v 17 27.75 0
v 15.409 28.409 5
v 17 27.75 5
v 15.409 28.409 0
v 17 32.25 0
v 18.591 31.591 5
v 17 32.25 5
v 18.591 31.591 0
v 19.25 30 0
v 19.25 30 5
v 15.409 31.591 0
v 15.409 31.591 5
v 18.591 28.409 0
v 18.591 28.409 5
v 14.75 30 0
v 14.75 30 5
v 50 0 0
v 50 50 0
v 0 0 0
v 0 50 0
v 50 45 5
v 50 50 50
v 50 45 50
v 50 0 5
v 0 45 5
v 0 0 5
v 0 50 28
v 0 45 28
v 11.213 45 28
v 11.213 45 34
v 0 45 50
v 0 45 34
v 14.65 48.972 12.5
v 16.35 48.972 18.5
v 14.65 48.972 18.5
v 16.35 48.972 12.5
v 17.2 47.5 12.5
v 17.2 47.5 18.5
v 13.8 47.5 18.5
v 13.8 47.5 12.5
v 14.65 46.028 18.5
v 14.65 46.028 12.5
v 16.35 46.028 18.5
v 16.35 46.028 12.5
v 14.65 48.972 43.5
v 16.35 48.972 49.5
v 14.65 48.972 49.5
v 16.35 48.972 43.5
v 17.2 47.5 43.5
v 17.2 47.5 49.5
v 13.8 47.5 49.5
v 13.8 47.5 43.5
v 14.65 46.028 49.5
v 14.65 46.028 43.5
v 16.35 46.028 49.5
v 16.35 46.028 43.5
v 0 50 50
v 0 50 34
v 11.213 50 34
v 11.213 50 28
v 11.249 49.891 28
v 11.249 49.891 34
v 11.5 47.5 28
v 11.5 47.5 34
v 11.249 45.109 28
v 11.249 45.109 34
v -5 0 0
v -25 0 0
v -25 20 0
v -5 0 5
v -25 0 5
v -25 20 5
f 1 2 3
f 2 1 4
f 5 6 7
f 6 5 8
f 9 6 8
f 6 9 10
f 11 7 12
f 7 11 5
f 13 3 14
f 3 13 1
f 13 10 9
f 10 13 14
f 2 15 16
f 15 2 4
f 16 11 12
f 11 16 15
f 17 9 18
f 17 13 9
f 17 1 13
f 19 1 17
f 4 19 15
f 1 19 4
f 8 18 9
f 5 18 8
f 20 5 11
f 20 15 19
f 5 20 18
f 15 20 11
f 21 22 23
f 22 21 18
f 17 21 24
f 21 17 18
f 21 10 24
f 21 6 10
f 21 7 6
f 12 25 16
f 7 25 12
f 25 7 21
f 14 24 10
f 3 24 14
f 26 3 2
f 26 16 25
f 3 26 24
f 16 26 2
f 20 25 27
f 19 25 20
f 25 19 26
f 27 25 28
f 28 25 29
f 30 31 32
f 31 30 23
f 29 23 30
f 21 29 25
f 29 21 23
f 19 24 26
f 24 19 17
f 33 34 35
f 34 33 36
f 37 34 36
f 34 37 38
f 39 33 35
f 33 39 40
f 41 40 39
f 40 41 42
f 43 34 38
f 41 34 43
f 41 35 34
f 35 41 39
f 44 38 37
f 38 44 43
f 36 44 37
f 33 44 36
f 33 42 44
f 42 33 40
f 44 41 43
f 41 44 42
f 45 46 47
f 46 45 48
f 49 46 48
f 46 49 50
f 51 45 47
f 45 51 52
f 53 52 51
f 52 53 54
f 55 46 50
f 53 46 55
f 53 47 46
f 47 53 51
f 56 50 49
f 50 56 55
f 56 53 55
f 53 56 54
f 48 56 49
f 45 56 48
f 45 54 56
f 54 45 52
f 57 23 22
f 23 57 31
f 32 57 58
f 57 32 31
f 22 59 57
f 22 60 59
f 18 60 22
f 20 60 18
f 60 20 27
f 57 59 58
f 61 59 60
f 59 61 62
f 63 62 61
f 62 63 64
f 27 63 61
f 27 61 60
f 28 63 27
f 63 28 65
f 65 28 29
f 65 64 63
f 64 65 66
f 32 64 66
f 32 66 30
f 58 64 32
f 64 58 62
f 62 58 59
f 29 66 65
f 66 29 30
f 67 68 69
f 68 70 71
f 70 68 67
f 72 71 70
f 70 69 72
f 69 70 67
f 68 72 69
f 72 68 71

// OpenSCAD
// NEMA 17 Stepper Motor Mounting Bracket for Syringe Pump
// Units: millimetres

// --- Base Plate Dimensions ---
base_width = 50;       // X extent: -25 to 25
base_depth = 45;      // Y extent: 0 to 45
base_thickness = 5;    // Z extent: 0 to 5

// --- Base Plate Hole Locations ---
hole_m4_x = 17;        // X position of M4 holes (symmetric)
hole_m4_y = 30;        // Y position of M4 holes
hole_m4_dia = 4.5;     // Diameter for M4 threaded holes

// --- Vertical Motor Plate Dimensions ---
motor_plate_width = 50; // X extent: -25 to 25
motor_plate_height = 50; // Z extent: 0 to 50
motor_plate_thickness = 5; // Y extent: 0 to 5 (standing on base)

// --- Motor Plate Features ---
motor_boss_dia = 23;    // Diameter of centring boss hole
motor_boss_x = 0;       // X center of boss hole
motor_boss_z = 28;      // Z center of boss hole

// M3 Screw Pattern
screw_pattern_size = 31; // Square pattern size for M3 holes
screw_dia = 3.4;       // Diameter for M3 holes
screw_offset = screw_pattern_size / 2; // Distance from center to hole

// --- Gusset Dimensions ---
gusset_thickness = 5;   // Thickness of gussets
gusset_leg_y = 20;      // Length of leg along Y
gusset_leg_z = 20;      // Length of leg along Z
gusset_corner_y = 5;    // Y position of right-angle corner
gusset_corner_z = 5;    // Z position of right-angle corner

// --- Helper Variables ---
// Ensure holes extend past faces for clean cuts
hole_extend = 1;        // Extra length for through-holes

// --- Main Assembly ---

module base_plate() {
    // Main base block
    difference() {
        cube([base_width, base_depth, base_thickness], center = false);
        
        // Two M4 holes
        for (i = [-1, 1]) {
            translate([i * hole_m4_x, hole_m4_y, 0])
                cylinder(d = hole_m4_dia, h = base_thickness + hole_extend, center = false);
        }
    }
}

module motor_plate() {
    // Main vertical block
    difference() {
        cube([motor_plate_width, motor_plate_thickness, motor_plate_height], center = false);
        
        // Centering boss hole (23mm)
        translate([motor_boss_x, motor_plate_thickness/2, motor_boss_z])
            cylinder(d = motor_boss_dia, h = motor_plate_thickness + hole_extend, center = false);
        
        // Four M3 screw holes on 31mm square pattern
        for (i = [-1, 1]) {
            for (j = [-1, 1]) {
                translate([i * screw_offset, motor_plate_thickness/2, motor_boss_z + j * screw_offset])
                    cylinder(d = screw_dia, h = motor_plate_thickness + hole_extend, center = false);
            }
        }
    }
}

module gusset(side) {
    // side = -1 for left, 1 for right
    // Right triangle in YZ plane
    // Legs: 20mm along Y, 20mm along Z
    // Right angle at (y=5, z=5)
    // Hypotenuse connects (y=25, z=5) to (y=5, z=25)
    
    translate([side * 25, 0, 0]) // Position at edge of base (x = -25 or 25)
        linear_extrude(height = gusset_thickness)
            polygon([
                [0, 0],
                [0, gusset_leg_y],
                [gusset_leg_z, gusset_leg_y], // Wait, let's re-verify geometry
                // Right angle at y=5, z=5.
                // Leg 1: y from 5 to 25 (length 20).
                // Leg 2: z from 5 to 25 (length 20).
                // Triangle vertices: (5,5), (25,5), (5,25).
                // In 2D polygon (y, z):
                [5, 5],
                [25, 5],
                [5, 25]
            ]);
}

// --- Construction ---

union() {
    // Base plate
    base_plate();
    
    // Vertical motor plate (placed on back edge of base)
    // Base is at z=0, motor plate stands on it.
    // Motor plate Y range: 0 to 5. Base Y range: 0 to 45.
    // "Standing on the back edge of the base" implies Y=0 of motor plate aligns with Y=0 of base?
    // Or does it mean the back edge of the base (Y=45)?
    // Re-reading: "standing on the back edge of the base".
    // Usually, an L-bracket has the vertical part at the back.
    // If base is Y 0..45, back edge is Y=45.
    // If motor plate is Y 0..5, and stands on back edge, its Y=0 should be at base Y=45.
    // Let's align motor plate Y=0 with base Y=45.
    translate([0, 45, 0])
        motor_plate();
    
    // Gussets
    // Left gusset: x from -25 to -20.
    // Right gusset: x from 20 to 25.
    // "flush with the left and right edges (x = -25 to -20 and x = 20 to 25)"
    // This implies the gusset is a triangular prism.
    // The previous module `gusset` used a polygon in YZ plane extruded in X.
    // Let's adjust the gusset module to be a solid block with triangular cross-section.
    
    // Left Gusset
    translate([-25, 0, 0])
        linear_extrude(height = 5) // Thickness in X? No, thickness is 5mm.
            // Wait, "5 mm thick, flush with left and right edges".
            // If it's flush with x=-25 to -20, the thickness is 5mm in X.
            // The triangle is in YZ plane.
            // So we extrude the triangle along X from -25 to -20.
            polygon([
                [0, 0], // y=5, z=5 (corner)
                [20, 0], // y=25, z=5 (end of leg Y)
                [0, 20]  // y=5, z=25 (end of leg Z)
            ]);
            
    // Right Gusset
    translate([20, 0, 0])
        linear_extrude(height = 5)
            polygon([
                [0, 0], // y=5, z=5
                [20, 0], // y=25, z=5
                [0, 20]  // y=5, z=25
            ]);
}
